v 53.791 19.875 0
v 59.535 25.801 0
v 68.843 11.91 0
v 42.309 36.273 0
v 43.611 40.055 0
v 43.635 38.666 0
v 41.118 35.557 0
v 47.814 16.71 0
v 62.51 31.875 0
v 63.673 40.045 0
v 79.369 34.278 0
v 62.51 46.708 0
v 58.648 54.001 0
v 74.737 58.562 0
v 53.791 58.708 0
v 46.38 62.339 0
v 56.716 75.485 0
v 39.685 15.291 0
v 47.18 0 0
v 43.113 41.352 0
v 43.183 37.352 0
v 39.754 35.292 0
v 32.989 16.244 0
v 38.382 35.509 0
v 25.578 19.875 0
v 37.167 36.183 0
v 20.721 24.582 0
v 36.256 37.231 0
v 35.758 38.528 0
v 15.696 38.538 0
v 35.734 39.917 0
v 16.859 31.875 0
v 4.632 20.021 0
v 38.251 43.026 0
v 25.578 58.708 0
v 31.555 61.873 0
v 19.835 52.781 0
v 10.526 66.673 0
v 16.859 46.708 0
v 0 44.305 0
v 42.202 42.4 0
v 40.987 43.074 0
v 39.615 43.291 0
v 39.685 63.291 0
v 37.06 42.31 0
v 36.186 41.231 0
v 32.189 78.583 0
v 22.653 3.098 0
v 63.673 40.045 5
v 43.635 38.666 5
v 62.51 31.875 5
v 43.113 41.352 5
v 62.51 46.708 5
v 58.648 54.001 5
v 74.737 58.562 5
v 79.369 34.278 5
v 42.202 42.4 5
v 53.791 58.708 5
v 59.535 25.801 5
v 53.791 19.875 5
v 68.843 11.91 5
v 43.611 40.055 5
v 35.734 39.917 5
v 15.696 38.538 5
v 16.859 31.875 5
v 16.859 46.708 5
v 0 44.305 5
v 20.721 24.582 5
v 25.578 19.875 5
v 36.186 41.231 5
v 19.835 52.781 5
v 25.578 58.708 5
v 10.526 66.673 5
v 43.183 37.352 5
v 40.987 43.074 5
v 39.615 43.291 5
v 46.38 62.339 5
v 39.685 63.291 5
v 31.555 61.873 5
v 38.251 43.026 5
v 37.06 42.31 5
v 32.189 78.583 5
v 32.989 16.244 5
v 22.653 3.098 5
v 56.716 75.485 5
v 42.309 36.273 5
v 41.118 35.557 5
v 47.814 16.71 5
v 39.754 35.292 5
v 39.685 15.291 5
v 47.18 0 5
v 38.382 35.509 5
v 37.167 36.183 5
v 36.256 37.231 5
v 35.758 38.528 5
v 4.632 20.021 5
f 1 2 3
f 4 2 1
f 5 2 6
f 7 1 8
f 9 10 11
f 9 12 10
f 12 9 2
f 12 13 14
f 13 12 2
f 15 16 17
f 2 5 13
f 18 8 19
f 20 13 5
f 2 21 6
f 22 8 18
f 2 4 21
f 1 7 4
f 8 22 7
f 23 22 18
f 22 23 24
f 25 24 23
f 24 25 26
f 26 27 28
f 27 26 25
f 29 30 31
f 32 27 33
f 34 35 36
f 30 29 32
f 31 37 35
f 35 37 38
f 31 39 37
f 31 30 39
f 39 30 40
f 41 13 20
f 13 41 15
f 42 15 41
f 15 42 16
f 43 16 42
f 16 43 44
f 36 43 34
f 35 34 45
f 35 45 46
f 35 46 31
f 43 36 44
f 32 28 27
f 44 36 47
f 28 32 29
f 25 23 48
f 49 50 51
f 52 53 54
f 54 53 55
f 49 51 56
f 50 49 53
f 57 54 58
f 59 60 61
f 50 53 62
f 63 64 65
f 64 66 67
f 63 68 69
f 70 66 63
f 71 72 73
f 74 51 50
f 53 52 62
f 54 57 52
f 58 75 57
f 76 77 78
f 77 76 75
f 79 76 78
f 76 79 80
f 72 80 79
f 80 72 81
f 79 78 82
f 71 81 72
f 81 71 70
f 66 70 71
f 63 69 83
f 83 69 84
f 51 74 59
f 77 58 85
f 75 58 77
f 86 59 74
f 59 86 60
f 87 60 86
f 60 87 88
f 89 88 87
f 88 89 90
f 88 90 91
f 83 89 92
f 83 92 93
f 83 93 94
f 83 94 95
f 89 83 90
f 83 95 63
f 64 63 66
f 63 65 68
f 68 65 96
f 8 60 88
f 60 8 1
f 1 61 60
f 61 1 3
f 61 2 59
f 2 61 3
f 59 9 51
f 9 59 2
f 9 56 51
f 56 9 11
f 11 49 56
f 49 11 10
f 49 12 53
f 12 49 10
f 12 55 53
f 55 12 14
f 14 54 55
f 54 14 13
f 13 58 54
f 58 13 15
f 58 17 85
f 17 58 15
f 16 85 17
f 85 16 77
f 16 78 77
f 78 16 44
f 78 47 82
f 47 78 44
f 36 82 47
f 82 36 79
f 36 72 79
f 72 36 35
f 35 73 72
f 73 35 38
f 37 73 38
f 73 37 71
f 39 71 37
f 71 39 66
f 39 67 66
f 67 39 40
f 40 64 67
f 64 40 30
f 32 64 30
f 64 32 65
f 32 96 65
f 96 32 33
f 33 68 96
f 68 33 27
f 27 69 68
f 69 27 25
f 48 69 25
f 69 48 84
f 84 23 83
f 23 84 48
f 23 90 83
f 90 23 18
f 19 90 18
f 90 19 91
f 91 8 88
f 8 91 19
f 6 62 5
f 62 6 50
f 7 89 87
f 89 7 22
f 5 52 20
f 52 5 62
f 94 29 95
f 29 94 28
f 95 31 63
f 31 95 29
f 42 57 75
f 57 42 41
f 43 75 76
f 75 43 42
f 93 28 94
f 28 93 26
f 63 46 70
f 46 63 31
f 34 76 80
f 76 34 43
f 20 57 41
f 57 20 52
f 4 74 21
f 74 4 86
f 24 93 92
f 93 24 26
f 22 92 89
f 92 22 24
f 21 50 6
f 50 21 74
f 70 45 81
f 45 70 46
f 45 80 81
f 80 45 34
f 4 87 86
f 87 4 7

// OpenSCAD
$fn = 32;

// ----------------------------------------------------------------------
// Star wheel: 10-point ratchet, R40
// ----------------------------------------------------------------------

// --- parameters (mm) ---
n_points = 10;            // number of points / teeth
r_out = 40;               // tip radius
r_in = 24;                // root radius
bore_r = 4;               // centre bore radius
plate_t = 5;              // plate thickness, Z (extrusion height)
bore_d = 8;               // centre bore diameter
fit_tol = 0.02;           // declared fit tolerance (prompt contract)
free_tol = 0.2;           // declared free tolerance (prompt contract)

profile = [[39.685, 63.291], [32.189, 78.583], [31.555, 61.873], [25.578, 58.708], [10.526, 66.673], [19.835, 52.781], [16.859, 46.708], [0, 44.305], [15.696, 38.538], [16.859, 31.875], [4.632, 20.021], [20.721, 24.582], [25.578, 19.875], [22.653, 3.098], [32.989, 16.244], [39.685, 15.291], [47.18, 0], [47.814, 16.71], [53.791, 19.875], [68.843, 11.91], [59.535, 25.801], [62.51, 31.875], [79.369, 34.278], [63.673, 40.045], [62.51, 46.708], [74.737, 58.562], [58.648, 54.001], [53.791, 58.708], [56.716, 75.485], [46.38, 62.339]];  // primary outline, 30 points, counter clockwise
void_1 = [[43.611, 40.055], [43.113, 41.352], [42.202, 42.4], [40.987, 43.074], [39.615, 43.291], [38.251, 43.026], [37.06, 42.31], [36.186, 41.231], [35.734, 39.917], [35.758, 38.528], [36.256, 37.231], [37.167, 36.183], [38.382, 35.509], [39.754, 35.292], [41.118, 35.557], [42.309, 36.273], [43.183, 37.352], [43.635, 38.666]];  // centre bore, 18 points

// --- the one profile operation ---
difference() {
  linear_extrude(height = plate_t) polygon(points = profile);
  translate([0, 0, -1])
    linear_extrude(height = plate_t + 2) polygon(points = void_1);
}
